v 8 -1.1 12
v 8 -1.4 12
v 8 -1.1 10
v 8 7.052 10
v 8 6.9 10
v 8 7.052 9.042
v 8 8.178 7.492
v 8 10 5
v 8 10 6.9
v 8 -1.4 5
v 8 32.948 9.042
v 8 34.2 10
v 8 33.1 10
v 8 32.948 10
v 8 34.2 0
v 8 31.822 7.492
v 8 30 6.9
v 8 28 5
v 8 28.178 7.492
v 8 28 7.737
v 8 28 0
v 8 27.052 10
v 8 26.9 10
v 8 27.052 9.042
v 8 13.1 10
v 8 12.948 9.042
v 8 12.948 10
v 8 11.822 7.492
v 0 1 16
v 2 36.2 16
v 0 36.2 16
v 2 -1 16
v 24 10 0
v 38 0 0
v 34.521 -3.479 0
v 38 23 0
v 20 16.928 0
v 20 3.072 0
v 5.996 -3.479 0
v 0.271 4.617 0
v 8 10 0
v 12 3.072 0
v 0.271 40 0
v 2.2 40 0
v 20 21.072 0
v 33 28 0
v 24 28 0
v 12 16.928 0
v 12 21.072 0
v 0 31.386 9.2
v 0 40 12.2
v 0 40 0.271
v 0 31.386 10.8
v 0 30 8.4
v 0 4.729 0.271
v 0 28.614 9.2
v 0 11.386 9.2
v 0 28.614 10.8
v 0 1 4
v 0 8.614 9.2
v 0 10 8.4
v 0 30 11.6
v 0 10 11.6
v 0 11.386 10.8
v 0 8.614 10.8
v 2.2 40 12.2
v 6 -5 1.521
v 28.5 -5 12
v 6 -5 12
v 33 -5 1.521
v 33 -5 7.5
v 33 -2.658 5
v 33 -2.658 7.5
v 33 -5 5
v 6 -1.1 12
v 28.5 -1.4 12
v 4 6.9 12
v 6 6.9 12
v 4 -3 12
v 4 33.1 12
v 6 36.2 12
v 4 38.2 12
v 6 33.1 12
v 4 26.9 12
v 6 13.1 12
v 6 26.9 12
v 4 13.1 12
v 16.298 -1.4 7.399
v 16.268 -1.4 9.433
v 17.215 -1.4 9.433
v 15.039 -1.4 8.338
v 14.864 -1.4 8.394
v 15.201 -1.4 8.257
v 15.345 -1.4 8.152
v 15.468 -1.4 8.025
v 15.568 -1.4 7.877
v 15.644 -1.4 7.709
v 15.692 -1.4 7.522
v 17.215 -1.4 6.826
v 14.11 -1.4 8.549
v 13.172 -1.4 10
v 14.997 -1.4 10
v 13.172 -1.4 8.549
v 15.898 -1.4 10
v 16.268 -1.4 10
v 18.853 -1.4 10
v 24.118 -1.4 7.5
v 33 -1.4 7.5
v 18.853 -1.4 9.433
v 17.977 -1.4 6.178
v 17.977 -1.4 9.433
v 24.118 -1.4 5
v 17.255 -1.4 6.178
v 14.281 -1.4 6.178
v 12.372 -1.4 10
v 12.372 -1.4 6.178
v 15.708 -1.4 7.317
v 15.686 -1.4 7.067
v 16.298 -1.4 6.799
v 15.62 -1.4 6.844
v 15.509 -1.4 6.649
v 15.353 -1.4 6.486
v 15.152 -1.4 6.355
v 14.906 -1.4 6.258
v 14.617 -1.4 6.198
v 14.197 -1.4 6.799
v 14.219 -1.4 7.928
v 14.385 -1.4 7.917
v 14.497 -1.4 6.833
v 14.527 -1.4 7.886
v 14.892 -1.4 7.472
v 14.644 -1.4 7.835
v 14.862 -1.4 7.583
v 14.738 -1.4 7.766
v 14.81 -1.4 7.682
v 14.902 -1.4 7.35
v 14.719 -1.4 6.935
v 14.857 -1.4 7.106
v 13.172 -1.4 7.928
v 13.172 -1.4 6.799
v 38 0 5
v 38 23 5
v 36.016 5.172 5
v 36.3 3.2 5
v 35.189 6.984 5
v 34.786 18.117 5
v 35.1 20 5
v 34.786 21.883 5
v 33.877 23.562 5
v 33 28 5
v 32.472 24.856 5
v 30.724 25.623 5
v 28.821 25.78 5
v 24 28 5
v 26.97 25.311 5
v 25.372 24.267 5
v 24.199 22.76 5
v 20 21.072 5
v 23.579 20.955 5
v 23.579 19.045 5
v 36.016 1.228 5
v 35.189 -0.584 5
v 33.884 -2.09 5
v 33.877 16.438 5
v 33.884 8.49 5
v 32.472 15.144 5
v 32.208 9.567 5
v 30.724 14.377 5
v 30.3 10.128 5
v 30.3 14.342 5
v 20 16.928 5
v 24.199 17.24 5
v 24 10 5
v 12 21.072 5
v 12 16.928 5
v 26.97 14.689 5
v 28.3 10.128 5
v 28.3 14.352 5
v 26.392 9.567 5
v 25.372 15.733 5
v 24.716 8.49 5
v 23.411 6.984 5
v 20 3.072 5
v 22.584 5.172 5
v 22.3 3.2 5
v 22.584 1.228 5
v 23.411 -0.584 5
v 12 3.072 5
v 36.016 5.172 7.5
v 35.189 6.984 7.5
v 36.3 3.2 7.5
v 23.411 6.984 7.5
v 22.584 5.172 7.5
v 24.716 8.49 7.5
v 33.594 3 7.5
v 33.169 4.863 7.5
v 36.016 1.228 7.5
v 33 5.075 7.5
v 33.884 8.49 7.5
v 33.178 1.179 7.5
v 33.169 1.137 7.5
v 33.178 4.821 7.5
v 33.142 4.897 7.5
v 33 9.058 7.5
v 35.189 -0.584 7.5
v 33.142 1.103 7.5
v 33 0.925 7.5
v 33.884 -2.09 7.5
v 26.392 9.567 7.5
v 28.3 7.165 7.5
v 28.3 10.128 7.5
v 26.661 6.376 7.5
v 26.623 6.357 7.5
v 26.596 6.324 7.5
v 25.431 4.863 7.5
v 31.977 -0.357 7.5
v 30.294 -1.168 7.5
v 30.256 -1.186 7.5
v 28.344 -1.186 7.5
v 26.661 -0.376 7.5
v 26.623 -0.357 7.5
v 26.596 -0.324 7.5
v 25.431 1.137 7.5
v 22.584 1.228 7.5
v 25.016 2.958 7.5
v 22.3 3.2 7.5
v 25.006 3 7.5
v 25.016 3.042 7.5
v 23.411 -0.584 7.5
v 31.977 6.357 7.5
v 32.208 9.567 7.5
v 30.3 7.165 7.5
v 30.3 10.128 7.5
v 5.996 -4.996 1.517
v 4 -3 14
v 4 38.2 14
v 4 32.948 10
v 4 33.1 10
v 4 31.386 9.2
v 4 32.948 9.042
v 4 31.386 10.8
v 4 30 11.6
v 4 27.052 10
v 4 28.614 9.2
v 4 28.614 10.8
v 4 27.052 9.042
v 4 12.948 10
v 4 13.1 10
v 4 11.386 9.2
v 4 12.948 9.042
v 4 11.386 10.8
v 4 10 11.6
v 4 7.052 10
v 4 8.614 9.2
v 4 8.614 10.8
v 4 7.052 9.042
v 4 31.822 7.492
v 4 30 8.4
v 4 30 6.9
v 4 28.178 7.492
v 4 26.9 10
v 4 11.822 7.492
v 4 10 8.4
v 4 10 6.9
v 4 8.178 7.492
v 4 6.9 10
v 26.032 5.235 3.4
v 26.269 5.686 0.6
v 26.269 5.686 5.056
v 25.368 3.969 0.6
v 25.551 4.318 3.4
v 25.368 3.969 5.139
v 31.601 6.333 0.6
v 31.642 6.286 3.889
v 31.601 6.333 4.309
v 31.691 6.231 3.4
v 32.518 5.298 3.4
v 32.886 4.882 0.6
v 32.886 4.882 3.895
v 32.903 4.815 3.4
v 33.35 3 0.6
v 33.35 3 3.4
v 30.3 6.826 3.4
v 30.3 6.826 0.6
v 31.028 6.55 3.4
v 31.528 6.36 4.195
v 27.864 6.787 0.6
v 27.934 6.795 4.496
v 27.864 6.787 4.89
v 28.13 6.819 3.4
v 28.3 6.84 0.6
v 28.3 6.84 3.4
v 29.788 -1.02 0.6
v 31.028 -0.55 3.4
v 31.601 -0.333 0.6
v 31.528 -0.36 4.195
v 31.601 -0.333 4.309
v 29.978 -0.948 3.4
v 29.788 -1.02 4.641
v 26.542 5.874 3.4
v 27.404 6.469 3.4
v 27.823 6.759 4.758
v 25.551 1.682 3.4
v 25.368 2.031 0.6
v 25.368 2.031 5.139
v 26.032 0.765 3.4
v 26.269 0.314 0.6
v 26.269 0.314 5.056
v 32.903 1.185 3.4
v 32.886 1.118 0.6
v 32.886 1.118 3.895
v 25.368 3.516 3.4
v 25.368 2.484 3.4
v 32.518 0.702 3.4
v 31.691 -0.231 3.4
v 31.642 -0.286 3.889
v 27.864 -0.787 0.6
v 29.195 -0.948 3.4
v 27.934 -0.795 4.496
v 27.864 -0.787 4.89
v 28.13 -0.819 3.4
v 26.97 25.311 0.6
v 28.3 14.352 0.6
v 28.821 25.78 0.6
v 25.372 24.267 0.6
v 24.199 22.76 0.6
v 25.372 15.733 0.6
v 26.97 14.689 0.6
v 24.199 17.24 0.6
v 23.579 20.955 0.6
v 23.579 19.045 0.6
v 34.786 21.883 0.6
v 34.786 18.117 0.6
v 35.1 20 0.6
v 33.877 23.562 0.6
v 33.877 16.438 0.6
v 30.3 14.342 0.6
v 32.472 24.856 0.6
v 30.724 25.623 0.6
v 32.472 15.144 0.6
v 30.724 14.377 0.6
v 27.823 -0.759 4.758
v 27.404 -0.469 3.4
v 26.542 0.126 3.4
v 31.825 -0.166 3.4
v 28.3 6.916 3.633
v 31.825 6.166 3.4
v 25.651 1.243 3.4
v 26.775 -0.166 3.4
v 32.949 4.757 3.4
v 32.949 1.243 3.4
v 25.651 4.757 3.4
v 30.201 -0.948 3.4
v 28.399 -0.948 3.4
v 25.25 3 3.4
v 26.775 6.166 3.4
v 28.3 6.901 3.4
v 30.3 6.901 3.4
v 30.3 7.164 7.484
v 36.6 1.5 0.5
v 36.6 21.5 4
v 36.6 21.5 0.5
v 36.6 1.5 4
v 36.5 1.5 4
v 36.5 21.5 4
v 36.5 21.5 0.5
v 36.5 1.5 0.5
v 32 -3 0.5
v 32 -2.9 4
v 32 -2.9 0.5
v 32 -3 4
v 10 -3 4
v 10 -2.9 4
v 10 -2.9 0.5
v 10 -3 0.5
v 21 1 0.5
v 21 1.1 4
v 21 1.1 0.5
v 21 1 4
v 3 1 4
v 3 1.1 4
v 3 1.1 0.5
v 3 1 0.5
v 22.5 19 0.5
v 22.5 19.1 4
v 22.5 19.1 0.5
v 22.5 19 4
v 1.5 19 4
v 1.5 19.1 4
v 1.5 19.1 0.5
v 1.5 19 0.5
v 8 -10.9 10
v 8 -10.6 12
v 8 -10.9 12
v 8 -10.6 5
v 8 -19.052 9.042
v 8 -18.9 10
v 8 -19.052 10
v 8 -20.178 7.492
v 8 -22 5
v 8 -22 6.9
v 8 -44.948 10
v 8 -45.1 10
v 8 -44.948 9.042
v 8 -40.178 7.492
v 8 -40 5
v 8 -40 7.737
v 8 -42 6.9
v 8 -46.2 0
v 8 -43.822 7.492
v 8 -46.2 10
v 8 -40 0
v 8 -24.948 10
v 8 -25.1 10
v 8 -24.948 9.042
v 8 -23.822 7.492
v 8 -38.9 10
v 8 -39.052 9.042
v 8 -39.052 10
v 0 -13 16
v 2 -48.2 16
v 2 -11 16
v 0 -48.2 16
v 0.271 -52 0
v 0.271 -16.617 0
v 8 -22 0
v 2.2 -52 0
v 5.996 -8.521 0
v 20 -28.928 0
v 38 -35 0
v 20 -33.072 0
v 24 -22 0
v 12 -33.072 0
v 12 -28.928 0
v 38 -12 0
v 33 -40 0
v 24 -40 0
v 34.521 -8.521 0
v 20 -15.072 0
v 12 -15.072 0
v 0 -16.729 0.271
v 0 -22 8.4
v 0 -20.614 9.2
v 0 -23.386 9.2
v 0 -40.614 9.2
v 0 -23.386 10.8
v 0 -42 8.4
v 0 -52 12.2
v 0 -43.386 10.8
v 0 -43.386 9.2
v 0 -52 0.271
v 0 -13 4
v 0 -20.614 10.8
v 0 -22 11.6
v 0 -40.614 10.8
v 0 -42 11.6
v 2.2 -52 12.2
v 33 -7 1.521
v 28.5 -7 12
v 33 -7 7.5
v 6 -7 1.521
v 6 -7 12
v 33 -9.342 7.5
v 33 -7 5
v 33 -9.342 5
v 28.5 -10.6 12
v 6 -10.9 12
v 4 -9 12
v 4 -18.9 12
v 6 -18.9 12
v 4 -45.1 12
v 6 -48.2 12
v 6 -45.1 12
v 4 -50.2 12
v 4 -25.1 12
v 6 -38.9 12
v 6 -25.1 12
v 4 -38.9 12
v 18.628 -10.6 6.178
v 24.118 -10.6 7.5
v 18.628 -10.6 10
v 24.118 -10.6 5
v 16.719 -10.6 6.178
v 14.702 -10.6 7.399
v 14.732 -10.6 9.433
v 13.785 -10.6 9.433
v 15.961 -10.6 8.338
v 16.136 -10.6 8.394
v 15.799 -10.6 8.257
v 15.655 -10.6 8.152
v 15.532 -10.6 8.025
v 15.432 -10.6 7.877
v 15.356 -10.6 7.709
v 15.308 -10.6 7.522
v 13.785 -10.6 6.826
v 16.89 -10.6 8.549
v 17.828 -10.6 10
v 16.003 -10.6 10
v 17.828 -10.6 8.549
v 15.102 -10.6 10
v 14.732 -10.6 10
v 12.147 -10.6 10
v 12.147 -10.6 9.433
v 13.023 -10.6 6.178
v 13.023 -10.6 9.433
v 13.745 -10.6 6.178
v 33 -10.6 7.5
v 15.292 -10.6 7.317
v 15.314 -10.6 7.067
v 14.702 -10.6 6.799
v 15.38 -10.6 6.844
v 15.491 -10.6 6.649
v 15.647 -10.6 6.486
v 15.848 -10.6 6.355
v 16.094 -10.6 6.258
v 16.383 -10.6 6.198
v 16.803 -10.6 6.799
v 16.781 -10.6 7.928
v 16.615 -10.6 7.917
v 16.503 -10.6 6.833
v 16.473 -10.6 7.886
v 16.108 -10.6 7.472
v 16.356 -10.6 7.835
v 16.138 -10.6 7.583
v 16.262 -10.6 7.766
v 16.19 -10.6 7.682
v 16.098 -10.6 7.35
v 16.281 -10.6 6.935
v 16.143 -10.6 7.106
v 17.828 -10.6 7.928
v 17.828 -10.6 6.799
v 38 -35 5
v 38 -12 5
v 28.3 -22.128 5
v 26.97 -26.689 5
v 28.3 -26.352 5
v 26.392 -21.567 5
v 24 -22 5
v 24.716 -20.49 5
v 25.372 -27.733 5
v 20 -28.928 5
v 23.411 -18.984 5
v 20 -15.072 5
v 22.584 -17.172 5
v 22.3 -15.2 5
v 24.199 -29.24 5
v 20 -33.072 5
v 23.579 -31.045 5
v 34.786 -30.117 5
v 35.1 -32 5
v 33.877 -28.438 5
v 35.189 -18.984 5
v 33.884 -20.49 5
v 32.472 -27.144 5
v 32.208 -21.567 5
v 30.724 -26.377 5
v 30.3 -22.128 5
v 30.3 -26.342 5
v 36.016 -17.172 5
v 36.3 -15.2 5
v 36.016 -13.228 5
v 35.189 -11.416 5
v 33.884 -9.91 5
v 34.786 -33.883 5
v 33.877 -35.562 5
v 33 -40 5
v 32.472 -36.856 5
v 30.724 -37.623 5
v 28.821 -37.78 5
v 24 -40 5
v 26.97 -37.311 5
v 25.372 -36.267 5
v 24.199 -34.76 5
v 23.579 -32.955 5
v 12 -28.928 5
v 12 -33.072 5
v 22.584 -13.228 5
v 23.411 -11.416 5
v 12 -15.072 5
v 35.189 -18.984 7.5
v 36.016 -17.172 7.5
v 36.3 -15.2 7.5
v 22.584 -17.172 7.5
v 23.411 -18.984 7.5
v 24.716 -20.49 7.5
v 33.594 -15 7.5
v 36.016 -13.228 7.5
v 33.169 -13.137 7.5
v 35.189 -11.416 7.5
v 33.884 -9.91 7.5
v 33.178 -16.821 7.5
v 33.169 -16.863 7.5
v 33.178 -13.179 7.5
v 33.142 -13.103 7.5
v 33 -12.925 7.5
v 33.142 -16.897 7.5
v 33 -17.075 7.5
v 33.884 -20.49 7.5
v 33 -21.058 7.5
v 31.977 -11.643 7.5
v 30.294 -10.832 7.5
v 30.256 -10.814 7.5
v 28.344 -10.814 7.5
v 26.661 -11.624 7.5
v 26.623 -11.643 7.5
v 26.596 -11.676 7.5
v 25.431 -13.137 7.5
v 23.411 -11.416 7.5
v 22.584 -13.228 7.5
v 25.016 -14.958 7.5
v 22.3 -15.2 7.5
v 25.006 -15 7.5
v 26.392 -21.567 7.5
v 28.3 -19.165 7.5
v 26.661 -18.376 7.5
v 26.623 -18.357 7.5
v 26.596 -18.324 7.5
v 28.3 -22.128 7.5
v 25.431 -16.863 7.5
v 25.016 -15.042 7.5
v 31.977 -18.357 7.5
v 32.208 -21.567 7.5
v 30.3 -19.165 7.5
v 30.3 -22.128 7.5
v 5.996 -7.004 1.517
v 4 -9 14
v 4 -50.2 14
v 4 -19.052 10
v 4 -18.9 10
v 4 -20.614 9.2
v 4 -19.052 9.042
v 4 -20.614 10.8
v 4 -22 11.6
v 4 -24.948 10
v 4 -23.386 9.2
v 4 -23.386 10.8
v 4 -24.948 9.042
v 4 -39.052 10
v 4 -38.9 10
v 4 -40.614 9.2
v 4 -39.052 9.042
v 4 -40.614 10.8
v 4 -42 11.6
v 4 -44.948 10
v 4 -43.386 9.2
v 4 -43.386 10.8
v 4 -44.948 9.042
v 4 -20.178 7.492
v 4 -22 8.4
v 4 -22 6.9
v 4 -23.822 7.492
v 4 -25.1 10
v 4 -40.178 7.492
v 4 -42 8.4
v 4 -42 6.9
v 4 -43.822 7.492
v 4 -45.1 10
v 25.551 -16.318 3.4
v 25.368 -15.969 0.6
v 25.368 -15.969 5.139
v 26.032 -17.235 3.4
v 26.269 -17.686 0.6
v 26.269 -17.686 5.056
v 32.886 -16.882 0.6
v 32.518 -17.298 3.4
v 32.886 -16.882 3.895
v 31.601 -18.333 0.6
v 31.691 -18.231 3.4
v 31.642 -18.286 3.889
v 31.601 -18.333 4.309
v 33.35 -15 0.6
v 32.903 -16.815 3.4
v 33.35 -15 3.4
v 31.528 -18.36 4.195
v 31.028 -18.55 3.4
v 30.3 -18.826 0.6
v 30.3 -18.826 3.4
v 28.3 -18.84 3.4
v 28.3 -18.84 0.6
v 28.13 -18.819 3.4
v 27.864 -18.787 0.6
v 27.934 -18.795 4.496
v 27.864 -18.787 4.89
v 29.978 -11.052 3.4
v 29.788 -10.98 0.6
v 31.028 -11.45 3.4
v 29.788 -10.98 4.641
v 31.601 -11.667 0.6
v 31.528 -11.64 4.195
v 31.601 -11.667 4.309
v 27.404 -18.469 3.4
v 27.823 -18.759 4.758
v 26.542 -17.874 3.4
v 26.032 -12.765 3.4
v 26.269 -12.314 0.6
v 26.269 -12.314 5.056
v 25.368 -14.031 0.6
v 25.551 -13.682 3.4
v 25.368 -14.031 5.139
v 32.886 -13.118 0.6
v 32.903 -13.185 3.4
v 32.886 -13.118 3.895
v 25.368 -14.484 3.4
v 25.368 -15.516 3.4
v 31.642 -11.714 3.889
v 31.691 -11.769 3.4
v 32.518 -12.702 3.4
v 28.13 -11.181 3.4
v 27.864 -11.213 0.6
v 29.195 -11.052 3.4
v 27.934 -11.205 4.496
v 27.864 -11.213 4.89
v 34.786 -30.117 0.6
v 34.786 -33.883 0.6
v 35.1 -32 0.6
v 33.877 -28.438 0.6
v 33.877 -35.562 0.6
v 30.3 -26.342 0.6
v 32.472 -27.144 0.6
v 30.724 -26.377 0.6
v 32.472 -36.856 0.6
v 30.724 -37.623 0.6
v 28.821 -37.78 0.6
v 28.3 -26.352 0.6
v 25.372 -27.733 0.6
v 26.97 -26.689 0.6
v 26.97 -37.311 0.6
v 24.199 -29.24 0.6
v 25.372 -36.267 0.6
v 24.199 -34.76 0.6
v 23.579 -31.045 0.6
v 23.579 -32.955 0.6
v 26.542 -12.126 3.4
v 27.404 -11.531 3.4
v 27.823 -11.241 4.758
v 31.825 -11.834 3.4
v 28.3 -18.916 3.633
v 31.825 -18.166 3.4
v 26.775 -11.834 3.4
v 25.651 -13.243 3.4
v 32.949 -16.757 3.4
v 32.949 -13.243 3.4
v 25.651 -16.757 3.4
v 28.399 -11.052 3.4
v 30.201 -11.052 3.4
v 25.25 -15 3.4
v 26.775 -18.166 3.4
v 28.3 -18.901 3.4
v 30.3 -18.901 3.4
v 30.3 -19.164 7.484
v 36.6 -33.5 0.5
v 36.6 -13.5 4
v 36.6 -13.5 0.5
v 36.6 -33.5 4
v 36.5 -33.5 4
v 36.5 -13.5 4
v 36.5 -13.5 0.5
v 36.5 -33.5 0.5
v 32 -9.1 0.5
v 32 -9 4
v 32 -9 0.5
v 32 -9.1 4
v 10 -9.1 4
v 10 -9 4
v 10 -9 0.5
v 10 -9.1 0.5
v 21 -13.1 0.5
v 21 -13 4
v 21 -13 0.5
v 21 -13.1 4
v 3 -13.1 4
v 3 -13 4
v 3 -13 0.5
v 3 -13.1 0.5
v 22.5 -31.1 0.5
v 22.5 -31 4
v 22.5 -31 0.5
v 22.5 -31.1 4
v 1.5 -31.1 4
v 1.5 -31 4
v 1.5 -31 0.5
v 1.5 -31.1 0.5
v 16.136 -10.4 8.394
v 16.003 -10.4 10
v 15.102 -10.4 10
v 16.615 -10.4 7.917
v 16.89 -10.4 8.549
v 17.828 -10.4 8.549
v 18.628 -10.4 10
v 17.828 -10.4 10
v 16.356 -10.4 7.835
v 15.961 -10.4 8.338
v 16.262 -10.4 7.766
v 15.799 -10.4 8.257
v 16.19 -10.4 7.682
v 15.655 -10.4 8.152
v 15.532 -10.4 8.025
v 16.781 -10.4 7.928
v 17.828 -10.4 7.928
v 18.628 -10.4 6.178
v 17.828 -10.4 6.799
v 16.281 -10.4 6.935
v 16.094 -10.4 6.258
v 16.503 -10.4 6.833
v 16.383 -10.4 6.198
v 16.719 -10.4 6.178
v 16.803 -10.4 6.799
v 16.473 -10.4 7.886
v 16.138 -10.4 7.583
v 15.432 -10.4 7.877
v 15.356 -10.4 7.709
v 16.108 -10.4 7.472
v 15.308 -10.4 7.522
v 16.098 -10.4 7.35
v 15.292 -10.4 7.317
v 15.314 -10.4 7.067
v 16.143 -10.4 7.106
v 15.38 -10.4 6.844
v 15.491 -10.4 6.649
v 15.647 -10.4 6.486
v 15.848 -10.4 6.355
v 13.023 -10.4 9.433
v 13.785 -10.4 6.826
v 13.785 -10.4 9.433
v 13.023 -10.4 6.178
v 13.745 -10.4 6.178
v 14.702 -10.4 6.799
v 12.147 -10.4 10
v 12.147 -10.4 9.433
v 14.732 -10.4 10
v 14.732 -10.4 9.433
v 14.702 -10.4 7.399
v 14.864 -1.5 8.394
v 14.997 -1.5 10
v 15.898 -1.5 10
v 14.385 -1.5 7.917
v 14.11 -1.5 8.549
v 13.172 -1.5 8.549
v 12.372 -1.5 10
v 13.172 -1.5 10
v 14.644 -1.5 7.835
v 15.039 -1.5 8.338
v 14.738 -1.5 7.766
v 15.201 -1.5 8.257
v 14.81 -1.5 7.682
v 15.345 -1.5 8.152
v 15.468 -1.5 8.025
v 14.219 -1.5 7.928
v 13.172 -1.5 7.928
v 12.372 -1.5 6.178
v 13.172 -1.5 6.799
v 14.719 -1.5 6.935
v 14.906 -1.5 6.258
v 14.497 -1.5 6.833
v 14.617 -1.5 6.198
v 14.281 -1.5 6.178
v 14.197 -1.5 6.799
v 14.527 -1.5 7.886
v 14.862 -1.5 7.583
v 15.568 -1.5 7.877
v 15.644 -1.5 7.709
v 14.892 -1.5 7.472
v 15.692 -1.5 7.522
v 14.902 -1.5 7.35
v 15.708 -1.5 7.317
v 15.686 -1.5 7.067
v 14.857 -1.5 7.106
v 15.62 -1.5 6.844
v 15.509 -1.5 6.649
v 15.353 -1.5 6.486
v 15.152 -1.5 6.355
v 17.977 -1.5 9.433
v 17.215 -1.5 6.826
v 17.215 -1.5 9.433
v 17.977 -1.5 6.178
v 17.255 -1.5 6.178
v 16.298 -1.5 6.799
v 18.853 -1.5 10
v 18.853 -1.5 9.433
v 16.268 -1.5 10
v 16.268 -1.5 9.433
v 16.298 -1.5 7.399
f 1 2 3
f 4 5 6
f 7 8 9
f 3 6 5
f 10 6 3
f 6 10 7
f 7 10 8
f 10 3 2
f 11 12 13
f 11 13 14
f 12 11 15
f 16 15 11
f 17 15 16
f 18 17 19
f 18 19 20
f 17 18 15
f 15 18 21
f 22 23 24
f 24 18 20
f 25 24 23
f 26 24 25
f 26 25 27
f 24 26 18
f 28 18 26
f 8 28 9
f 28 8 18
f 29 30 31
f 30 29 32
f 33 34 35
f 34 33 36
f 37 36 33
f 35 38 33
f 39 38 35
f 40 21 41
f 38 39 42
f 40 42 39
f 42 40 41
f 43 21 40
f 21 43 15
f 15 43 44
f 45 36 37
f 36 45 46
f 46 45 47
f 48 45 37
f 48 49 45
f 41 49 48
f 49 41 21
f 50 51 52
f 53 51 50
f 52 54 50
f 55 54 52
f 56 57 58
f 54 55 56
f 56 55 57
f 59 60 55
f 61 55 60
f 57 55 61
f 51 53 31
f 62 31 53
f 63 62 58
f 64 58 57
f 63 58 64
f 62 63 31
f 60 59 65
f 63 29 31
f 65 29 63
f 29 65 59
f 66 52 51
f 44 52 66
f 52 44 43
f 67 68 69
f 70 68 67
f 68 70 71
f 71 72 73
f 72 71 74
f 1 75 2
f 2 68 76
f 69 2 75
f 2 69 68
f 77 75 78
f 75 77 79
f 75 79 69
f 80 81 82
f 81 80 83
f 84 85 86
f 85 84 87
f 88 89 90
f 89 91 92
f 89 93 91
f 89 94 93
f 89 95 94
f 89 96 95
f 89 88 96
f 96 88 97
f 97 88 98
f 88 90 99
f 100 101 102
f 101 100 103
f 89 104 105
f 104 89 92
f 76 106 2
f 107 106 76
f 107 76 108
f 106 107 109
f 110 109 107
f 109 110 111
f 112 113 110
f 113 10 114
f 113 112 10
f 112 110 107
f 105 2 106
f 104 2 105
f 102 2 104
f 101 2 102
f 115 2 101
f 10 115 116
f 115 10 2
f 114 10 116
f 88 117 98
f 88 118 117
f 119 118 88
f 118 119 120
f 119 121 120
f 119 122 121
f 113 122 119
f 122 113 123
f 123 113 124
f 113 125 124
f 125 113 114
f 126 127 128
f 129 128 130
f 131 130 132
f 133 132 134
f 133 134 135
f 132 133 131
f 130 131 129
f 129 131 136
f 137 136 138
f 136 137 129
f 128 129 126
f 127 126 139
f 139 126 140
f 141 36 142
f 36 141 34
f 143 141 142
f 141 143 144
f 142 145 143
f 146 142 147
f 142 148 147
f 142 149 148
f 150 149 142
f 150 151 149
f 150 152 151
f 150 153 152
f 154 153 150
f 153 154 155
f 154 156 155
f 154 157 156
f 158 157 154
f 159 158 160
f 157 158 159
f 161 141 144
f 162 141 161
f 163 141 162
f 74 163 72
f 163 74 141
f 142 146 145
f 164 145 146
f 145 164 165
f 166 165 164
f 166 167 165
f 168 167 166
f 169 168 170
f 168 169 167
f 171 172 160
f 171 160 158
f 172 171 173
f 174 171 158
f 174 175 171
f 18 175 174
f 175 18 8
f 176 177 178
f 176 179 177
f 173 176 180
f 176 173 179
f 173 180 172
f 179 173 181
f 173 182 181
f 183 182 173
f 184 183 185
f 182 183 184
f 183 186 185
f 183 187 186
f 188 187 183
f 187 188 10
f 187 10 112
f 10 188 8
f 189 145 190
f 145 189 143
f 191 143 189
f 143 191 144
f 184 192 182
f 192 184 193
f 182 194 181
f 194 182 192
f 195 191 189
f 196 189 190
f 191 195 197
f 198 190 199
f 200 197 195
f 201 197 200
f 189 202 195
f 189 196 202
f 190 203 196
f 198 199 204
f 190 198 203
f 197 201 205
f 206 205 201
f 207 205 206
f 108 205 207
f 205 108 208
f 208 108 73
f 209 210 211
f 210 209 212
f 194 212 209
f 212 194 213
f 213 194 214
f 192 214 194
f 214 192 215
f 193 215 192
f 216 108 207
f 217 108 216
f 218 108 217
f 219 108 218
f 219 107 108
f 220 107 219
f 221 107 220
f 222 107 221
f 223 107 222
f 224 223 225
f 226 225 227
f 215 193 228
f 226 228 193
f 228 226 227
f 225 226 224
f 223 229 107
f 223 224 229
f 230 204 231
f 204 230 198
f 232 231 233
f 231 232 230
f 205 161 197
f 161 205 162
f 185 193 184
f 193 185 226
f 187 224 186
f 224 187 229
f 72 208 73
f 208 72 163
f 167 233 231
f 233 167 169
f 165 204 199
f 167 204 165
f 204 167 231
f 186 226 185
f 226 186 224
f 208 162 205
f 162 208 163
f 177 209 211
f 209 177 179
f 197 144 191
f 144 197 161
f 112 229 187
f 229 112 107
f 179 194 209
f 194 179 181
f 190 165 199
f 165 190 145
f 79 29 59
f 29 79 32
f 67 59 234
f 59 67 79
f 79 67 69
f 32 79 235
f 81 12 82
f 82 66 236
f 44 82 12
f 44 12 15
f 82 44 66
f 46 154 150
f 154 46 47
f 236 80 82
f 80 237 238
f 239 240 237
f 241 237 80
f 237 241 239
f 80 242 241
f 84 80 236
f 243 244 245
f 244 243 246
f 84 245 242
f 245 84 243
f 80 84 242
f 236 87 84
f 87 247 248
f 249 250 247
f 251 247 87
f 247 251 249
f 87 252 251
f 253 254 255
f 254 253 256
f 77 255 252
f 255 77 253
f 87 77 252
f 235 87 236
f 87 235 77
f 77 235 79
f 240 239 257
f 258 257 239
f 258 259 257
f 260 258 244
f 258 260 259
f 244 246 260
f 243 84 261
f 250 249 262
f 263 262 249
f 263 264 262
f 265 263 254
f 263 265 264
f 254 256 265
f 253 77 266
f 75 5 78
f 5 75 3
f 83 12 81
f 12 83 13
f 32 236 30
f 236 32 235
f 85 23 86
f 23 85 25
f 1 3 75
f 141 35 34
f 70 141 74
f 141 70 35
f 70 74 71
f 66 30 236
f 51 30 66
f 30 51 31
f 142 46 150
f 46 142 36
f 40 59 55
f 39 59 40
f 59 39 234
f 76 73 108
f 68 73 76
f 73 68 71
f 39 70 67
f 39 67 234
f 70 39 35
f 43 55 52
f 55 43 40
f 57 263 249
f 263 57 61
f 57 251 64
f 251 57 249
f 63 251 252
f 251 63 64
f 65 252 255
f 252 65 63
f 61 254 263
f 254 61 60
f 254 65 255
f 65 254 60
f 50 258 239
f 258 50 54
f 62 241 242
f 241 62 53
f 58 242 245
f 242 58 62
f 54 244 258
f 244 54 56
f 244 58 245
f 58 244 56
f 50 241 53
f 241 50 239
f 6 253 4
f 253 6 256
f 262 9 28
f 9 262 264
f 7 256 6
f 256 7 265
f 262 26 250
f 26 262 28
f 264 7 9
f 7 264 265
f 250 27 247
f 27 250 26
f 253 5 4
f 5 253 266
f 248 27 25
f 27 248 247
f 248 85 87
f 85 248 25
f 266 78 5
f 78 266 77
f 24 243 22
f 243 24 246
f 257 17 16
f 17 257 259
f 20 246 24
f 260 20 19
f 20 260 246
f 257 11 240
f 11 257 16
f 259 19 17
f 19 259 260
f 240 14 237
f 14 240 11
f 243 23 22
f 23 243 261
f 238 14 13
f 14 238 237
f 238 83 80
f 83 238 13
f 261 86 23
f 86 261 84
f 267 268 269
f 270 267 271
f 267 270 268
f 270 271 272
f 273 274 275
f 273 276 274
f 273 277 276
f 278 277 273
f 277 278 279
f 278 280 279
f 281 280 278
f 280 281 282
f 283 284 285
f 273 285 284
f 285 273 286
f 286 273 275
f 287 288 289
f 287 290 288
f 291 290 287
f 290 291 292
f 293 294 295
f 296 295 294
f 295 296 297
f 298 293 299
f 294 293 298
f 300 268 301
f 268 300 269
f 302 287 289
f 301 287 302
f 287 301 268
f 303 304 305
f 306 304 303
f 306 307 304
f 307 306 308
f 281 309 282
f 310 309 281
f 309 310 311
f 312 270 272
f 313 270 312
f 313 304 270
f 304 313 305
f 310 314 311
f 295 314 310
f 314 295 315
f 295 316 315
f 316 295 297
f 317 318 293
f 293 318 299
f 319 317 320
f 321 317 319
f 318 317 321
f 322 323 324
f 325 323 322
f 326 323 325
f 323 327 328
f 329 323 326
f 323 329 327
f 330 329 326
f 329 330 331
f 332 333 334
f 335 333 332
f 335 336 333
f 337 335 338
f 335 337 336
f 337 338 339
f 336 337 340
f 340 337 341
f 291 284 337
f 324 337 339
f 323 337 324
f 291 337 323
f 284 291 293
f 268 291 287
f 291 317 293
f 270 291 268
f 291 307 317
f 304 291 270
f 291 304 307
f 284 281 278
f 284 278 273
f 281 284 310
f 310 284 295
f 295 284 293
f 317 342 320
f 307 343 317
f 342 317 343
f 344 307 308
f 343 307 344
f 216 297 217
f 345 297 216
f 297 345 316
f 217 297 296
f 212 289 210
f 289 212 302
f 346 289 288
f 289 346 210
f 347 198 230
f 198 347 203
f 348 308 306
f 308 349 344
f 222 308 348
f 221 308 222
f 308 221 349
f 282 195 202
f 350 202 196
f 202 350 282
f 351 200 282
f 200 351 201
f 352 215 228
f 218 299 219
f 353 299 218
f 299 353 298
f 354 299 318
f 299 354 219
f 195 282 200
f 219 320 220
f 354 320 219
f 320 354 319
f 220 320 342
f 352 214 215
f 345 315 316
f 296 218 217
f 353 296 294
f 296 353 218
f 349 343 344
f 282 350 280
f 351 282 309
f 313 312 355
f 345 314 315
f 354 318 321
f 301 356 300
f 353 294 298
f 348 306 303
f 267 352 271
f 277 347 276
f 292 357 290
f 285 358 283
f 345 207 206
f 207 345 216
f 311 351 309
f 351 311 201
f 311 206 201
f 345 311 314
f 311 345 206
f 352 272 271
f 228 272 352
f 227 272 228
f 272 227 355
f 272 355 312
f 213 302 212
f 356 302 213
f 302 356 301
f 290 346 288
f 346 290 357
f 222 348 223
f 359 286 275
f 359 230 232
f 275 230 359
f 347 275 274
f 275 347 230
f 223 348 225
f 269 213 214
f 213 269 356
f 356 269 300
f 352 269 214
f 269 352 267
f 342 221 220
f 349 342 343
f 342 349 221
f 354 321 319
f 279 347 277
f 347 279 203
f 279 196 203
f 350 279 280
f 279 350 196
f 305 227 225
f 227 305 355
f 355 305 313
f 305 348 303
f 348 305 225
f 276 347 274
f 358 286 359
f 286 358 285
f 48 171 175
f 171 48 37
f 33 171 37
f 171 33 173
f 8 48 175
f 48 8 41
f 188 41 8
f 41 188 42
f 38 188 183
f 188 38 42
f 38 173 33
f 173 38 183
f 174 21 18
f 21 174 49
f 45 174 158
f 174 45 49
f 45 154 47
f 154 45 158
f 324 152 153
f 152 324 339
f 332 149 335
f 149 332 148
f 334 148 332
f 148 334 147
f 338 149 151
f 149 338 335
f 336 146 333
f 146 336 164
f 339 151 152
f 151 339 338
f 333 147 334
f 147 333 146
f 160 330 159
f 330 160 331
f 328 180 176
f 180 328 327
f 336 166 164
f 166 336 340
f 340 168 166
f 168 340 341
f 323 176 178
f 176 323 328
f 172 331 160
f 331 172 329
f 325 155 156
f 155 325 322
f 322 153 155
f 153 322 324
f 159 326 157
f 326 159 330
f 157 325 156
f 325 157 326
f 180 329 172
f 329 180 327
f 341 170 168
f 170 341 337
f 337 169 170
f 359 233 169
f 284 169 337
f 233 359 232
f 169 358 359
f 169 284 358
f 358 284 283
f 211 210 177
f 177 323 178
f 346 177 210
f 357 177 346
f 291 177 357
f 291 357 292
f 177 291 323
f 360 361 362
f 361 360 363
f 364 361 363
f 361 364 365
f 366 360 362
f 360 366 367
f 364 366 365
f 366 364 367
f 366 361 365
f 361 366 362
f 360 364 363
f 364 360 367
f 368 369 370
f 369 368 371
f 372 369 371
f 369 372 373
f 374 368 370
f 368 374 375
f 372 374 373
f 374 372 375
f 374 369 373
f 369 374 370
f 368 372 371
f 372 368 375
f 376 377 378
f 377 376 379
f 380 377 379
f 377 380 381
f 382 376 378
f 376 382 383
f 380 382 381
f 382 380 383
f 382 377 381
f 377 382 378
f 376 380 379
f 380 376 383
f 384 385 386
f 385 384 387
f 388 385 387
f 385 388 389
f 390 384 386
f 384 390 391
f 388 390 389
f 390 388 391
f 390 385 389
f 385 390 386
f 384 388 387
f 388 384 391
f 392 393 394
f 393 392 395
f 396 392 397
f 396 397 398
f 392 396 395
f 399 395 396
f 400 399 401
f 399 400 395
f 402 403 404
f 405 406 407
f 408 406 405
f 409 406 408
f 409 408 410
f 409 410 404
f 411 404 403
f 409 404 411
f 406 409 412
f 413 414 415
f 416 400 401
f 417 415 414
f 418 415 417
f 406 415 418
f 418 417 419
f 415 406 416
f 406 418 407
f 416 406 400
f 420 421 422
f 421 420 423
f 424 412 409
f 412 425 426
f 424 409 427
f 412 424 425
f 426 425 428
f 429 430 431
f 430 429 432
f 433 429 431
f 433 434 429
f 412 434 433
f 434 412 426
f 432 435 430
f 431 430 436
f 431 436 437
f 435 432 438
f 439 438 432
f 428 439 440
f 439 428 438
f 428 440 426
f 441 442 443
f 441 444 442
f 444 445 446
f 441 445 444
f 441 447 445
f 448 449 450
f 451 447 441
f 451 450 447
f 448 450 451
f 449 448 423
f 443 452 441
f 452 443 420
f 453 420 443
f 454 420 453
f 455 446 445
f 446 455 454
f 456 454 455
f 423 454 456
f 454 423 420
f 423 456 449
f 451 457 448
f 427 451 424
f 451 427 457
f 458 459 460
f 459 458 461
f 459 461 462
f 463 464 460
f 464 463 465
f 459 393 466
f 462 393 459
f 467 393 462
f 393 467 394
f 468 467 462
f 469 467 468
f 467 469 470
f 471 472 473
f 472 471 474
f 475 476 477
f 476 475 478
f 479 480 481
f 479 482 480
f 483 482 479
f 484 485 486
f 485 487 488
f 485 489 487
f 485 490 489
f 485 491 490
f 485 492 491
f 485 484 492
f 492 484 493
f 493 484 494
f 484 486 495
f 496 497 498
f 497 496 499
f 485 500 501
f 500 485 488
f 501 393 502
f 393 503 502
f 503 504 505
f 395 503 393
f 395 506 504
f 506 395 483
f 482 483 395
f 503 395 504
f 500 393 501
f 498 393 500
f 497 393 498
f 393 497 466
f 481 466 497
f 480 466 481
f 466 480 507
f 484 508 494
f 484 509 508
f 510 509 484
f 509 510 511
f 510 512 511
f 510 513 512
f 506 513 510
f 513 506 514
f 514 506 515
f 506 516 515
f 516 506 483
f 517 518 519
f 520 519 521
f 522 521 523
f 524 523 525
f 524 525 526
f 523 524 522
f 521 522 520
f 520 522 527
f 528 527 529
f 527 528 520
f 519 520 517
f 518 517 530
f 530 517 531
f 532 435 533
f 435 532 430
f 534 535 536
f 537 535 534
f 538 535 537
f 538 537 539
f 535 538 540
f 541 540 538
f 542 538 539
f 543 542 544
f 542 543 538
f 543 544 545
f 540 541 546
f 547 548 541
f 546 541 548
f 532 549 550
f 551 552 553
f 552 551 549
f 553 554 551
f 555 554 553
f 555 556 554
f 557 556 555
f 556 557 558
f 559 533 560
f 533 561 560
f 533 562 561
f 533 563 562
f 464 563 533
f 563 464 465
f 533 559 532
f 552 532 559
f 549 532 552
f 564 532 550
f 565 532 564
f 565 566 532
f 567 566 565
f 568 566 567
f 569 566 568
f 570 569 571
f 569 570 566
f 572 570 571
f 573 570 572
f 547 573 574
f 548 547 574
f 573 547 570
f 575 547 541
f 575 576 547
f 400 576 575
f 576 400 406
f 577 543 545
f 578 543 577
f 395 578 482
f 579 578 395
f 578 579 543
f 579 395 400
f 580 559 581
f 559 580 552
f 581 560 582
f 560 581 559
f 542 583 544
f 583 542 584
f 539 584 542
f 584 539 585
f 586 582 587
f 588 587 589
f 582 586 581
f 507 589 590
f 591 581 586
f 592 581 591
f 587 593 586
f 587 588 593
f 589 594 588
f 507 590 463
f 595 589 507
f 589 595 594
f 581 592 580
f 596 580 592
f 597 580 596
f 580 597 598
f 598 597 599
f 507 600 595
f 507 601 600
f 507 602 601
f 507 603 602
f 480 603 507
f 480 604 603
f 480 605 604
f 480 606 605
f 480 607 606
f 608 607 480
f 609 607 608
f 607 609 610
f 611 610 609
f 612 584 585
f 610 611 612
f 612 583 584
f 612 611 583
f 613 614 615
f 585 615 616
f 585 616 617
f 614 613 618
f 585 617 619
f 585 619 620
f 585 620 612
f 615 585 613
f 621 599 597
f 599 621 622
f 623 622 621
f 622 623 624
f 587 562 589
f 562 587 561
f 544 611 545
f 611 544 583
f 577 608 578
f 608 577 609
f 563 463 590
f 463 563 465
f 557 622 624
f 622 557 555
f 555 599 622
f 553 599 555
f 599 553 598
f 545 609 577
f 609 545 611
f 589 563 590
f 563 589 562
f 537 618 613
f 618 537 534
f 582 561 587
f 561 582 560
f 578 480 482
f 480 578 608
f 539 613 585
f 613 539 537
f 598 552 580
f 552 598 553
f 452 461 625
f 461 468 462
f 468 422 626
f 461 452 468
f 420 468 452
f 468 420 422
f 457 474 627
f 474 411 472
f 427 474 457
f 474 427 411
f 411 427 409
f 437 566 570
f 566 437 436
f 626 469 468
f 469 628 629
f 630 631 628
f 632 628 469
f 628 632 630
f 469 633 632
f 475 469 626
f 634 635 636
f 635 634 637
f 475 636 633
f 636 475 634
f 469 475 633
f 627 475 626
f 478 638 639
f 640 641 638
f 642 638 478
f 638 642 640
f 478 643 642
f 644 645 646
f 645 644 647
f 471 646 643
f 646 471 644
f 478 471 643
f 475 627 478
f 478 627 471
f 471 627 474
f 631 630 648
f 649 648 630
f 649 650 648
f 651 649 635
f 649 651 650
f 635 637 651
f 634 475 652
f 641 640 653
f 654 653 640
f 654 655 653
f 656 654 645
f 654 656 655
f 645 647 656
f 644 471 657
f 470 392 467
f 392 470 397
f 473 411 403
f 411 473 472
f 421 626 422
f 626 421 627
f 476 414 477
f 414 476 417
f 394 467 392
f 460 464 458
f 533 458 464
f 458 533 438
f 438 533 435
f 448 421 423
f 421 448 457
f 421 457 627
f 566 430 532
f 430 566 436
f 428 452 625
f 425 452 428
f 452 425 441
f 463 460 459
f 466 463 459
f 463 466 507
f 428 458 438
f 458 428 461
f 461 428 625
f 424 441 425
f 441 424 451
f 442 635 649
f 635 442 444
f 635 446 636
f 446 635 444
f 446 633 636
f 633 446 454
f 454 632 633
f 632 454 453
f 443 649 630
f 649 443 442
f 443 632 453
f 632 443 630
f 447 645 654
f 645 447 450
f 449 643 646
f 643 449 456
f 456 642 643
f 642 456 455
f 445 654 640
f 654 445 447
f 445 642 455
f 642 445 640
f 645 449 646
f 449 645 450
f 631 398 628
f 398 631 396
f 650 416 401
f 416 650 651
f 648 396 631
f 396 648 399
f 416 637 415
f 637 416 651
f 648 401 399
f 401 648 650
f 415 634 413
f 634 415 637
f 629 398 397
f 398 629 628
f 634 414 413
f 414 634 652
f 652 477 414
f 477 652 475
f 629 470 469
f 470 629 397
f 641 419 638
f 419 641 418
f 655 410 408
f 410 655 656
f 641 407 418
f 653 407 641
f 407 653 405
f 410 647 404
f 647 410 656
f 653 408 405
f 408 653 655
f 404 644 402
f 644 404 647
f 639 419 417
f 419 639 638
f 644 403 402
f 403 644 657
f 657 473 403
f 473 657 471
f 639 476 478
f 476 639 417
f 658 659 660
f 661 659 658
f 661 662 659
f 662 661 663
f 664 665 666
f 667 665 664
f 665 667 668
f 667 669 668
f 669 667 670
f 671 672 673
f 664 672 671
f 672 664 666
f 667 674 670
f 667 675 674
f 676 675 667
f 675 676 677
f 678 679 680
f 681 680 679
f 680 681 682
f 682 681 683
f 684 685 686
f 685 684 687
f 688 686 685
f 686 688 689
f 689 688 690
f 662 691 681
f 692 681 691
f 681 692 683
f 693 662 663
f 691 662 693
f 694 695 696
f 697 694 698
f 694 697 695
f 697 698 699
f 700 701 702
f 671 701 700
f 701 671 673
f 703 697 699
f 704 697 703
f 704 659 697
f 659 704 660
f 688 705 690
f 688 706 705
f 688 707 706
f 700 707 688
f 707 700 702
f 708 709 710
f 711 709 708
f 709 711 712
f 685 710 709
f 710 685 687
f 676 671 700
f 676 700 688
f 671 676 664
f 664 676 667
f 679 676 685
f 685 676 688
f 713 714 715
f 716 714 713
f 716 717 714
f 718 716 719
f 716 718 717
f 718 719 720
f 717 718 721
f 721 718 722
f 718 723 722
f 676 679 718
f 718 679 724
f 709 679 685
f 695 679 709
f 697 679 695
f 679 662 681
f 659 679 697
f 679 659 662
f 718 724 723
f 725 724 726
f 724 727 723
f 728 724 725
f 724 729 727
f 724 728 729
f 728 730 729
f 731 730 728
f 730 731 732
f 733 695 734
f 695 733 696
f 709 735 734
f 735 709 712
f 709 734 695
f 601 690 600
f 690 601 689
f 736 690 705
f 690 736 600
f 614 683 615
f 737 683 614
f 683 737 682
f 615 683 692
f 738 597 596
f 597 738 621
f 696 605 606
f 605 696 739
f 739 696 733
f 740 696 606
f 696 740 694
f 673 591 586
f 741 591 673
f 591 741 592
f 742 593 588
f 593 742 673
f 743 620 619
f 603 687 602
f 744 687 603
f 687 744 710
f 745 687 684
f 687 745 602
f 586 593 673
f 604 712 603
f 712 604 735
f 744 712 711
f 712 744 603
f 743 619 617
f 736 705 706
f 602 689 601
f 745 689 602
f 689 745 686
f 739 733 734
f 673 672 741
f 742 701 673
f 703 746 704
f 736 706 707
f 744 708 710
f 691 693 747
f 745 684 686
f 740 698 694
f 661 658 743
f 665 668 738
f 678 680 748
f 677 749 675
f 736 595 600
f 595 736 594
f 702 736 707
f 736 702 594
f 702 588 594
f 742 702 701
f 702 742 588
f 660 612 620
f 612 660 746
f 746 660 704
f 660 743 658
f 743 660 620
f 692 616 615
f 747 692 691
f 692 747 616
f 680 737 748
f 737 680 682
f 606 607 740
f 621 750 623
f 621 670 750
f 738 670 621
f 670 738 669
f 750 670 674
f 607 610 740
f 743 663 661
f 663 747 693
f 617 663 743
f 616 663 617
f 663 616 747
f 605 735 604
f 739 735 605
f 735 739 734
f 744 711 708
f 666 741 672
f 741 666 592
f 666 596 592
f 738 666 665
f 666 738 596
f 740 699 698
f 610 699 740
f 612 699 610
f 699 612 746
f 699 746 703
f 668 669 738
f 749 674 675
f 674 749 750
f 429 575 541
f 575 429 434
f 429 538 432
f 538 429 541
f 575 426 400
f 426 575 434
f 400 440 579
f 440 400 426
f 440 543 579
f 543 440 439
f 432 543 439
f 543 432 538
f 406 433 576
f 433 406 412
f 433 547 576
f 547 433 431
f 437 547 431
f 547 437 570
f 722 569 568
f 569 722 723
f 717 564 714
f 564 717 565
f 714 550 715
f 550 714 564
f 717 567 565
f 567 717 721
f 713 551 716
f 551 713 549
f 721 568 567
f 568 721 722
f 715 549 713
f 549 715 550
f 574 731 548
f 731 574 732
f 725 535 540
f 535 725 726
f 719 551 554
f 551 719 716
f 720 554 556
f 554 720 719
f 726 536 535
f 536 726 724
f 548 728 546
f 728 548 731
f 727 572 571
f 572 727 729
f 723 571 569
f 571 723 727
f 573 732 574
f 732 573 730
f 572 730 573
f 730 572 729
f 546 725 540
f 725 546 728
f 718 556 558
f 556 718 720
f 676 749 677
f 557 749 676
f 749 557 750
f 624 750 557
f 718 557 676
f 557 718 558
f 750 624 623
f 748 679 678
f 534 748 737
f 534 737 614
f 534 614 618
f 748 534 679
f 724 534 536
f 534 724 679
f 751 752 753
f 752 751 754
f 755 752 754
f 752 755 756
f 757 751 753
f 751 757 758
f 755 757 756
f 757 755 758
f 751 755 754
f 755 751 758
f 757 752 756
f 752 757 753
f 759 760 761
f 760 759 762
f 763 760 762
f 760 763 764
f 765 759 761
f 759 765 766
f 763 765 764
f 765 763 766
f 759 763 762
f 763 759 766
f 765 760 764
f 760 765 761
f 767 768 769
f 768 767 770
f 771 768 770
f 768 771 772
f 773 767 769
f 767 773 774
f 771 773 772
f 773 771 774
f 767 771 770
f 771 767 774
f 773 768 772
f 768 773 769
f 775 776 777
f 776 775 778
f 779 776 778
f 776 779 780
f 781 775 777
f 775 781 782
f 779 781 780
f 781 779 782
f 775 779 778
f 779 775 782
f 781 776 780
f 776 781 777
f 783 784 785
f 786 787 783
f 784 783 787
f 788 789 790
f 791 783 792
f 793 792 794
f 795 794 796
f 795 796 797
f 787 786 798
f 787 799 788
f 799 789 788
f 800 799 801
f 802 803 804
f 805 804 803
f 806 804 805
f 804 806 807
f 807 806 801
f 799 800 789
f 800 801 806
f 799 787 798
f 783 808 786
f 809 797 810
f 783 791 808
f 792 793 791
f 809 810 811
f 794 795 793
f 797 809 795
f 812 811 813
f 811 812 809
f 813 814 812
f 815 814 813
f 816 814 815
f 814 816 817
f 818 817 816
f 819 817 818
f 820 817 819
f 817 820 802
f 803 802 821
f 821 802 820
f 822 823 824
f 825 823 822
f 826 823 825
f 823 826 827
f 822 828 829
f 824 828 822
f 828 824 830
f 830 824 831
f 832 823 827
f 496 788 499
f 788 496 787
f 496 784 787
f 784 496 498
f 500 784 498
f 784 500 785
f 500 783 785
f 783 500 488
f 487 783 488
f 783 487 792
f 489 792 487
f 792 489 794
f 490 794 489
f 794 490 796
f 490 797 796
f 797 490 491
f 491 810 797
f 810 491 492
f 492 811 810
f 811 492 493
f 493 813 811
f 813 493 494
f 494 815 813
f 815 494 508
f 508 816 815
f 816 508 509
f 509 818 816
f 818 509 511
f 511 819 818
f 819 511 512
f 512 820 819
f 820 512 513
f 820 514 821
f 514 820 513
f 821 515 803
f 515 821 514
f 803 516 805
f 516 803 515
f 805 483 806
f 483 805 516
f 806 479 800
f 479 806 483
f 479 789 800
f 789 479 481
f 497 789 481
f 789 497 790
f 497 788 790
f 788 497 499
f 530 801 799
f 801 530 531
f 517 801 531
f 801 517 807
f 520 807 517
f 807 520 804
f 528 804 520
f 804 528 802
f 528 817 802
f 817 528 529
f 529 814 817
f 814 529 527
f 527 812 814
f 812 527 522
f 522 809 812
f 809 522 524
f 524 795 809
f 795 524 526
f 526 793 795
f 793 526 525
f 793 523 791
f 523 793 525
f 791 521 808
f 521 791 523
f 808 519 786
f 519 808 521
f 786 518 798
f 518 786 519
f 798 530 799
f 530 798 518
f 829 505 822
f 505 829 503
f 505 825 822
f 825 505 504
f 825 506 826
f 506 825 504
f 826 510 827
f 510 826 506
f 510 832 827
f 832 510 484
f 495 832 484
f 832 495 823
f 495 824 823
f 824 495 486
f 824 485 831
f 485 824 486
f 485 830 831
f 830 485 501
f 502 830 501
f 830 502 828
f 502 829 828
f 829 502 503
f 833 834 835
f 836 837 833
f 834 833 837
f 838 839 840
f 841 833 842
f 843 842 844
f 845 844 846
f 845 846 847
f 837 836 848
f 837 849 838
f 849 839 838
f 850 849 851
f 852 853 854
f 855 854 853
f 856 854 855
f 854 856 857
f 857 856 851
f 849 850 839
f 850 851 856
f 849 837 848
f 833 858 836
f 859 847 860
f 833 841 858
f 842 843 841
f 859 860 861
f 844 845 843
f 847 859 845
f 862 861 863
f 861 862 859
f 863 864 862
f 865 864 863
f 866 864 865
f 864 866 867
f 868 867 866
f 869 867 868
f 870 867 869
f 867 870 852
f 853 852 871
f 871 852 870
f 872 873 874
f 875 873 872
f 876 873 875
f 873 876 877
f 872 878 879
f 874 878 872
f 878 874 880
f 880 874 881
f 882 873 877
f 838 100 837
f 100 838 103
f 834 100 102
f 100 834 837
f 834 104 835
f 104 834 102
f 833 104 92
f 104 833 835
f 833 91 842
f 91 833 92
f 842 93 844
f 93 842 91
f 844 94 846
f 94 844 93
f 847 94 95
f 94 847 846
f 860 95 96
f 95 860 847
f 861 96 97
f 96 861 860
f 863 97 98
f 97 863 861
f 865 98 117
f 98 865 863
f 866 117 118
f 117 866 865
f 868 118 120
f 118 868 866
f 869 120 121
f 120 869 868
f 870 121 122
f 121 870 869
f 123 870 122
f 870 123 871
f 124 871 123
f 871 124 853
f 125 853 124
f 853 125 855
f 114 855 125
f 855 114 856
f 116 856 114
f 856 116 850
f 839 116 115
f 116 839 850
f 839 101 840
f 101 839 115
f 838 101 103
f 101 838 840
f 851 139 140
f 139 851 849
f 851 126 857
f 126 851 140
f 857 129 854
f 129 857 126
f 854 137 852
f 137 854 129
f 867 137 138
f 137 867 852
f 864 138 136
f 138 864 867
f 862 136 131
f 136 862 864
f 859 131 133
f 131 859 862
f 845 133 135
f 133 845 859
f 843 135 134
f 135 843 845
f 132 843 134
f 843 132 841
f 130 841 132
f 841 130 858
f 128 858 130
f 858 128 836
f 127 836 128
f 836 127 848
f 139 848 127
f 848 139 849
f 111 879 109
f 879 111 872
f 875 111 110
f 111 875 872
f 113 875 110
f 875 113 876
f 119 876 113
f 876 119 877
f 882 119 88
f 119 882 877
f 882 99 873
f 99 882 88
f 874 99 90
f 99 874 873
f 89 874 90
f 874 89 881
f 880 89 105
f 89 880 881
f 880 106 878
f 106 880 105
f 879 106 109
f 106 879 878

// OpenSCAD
// PIRANHA iteration1
// Z axis top
// GNU GPL v3
// Usan Siriwardana <usiriwar@uwaterloo.ca> and contributors
// based on Prusa i3 MK3S
// https://reprap.org/wiki/Prusa_i3_MK3

// assume lead screws don't poke out unless specified
lead_screw_hole = false;

module z_top_base()
{
    translate([0,-5,0]) cube([8,45,16]); // plate touching the base
    translate([0,-5,0]) cube([33,3.6,12]); // plate touching the base
    translate([0,-5,0]) cube([38,45,5]); // plate touching the base   
    translate([25+4.3,3.2,5]) rotate([0,0,0]) cylinder(h = 2.5, r=7);
}

module z_top_fancy()
{
    // Corner cutouts
    translate([0.5,0.5,0]) rotate([0,0,-45-180]) translate([-15,0,-1]) cube([30,30,51]);    

    // frame side angle
    translate([-13,40+5+10.2,-3]) rotate([0,0,-45-0]) translate([0,0,-1]) cube([30,30,51]);
    translate([8,28,-3]) translate([0,0,-1]) cube([50,50,51]);       

    // cut to shape
    translate([4,-1,12]) rotate([0,0, 0]) translate([0,-5,0]) cube([30,50,30]);          
    translate([6,0,12]) rotate([0,-45, 0]) translate([0,-5,0]) cube([30,50,30]);
    translate([8,3.9,10]) rotate([0,-45, 0]) translate([0,-5,0]) cube([30,50,30]);

    // nice edges
    translate([38-2.5,-5+2.5,-3]) rotate([0,0,-45-90]) translate([-15,0,-1]) cube([30,30,51]);         
    translate([-10,49,3.2]) rotate([45,0,0]) translate([-15,0,-1]) cube([50,20,20]);         
    
    // outer corner
    translate([35,26,-3]) rotate([0,0,-45])    translate([-15,0,-1]) cube([30,30,51]);
    translate([0,0,5]) rotate([45+180,0,0]) rotate([0,0,-45+90]) translate([0,0,-15]) cube([30,30,30]);

    // Stiffner cut out
    translate([33,-1,7.5]) rotate([0,-45,0]) translate([0,-5,0]) cube([30,50,30]);
    
    // side cut out
    translate([-6,-5,-5.55]) rotate([45,0,0])  cube([50,5,5]);
    translate([-6,-5,-0.8]) rotate([0,45,0])  cube([5,50,5]);
}

module z_top_holes()
{
    // Screw holes frame
    translate([-1,10,10])      rotate([0,90,0]) cylinder(h = 20, r=1.6);
    translate([-1,10+20,10])   rotate([0,90,0]) cylinder(h = 20, r=1.6);

    // Screw heads
    translate([4,10,10]) rotate([0,90,0]) cylinder(h = 20, r=3.1);
    translate([4,10-3.1,10]) cube([10,6.2,10]);
    translate([4,10+20,10])  rotate([0,90,0]) cylinder(h = 20, r=3.1);
    translate([4,10+20-3.1,10]) cube([10,6.2,10]);

    // Z rod holder
    translate([25+4.3,3,0.6]) rotate([0,0,0]) cylinder(h = 50, r=4.05);
    translate([25+4.3,3,3.4]) rotate([0,0,0]) cylinder(h = 4.2, r2=4.3, r1=4.05);
    
    // material saving cut
    translate([16,10,-4]) rotate([0,0,0]) cylinder(h = 50, r=8, $fn=6);  
    translate([16,28,-4]) rotate([0,0,0]) cylinder(h = 50, r=8, $fn=6);  

    // z screw hole
    translate([25+4.3,3+17,3]) rotate([0,0,0]) cylinder(h = 50, r=5.8); // screw hole
    translate([25+4.3,3+17,0.6]) rotate([0,0,0]) cylinder(h = 50, r=5.8); // screw hole
    translate([25+4.3-1,3,0.6]) cube([2,15,8]); // it's bit up because it helps with printing

    if(lead_screw_hole){
        translate([25+4.3,3+17,-10]) cylinder(h = 50, r=5.8);
    }

    //selective infill
    translate([36.5,1.5,0.5]) cube([0.1,20,3.5]);    
    translate([10,-3,0.5]) cube([22,0.1,3.5]);  
    translate([3,1,0.5]) cube([18,0.1,3.5]);    
    translate([1.5,19,0.5]) cube([21,0.1,3.5]); 
 
}

module z_top_right(){
    difference()
    {
        z_top_base();
        z_top_fancy();
        z_top_holes();
         //version
        translate([12,-1.5,10]) rotate([90,180,180]) linear_extrude(height = 0.6) 
        { text("R1",font = "helvetica:style=Bold", size=4); }
    }
}

module z_top_left(){
    translate([0,-12,0]) mirror([0,1,0]) 
    difference()
    {
        z_top_base();
        z_top_fancy();
        z_top_holes();
        //version
        translate([19,-1,10]) rotate([90,180,0]) linear_extrude(height = 0.6) 
        { text("R1",font = "helvetica:style=Bold", size=4); }
    }
}

// Final parts
z_top_left();
z_top_right();
